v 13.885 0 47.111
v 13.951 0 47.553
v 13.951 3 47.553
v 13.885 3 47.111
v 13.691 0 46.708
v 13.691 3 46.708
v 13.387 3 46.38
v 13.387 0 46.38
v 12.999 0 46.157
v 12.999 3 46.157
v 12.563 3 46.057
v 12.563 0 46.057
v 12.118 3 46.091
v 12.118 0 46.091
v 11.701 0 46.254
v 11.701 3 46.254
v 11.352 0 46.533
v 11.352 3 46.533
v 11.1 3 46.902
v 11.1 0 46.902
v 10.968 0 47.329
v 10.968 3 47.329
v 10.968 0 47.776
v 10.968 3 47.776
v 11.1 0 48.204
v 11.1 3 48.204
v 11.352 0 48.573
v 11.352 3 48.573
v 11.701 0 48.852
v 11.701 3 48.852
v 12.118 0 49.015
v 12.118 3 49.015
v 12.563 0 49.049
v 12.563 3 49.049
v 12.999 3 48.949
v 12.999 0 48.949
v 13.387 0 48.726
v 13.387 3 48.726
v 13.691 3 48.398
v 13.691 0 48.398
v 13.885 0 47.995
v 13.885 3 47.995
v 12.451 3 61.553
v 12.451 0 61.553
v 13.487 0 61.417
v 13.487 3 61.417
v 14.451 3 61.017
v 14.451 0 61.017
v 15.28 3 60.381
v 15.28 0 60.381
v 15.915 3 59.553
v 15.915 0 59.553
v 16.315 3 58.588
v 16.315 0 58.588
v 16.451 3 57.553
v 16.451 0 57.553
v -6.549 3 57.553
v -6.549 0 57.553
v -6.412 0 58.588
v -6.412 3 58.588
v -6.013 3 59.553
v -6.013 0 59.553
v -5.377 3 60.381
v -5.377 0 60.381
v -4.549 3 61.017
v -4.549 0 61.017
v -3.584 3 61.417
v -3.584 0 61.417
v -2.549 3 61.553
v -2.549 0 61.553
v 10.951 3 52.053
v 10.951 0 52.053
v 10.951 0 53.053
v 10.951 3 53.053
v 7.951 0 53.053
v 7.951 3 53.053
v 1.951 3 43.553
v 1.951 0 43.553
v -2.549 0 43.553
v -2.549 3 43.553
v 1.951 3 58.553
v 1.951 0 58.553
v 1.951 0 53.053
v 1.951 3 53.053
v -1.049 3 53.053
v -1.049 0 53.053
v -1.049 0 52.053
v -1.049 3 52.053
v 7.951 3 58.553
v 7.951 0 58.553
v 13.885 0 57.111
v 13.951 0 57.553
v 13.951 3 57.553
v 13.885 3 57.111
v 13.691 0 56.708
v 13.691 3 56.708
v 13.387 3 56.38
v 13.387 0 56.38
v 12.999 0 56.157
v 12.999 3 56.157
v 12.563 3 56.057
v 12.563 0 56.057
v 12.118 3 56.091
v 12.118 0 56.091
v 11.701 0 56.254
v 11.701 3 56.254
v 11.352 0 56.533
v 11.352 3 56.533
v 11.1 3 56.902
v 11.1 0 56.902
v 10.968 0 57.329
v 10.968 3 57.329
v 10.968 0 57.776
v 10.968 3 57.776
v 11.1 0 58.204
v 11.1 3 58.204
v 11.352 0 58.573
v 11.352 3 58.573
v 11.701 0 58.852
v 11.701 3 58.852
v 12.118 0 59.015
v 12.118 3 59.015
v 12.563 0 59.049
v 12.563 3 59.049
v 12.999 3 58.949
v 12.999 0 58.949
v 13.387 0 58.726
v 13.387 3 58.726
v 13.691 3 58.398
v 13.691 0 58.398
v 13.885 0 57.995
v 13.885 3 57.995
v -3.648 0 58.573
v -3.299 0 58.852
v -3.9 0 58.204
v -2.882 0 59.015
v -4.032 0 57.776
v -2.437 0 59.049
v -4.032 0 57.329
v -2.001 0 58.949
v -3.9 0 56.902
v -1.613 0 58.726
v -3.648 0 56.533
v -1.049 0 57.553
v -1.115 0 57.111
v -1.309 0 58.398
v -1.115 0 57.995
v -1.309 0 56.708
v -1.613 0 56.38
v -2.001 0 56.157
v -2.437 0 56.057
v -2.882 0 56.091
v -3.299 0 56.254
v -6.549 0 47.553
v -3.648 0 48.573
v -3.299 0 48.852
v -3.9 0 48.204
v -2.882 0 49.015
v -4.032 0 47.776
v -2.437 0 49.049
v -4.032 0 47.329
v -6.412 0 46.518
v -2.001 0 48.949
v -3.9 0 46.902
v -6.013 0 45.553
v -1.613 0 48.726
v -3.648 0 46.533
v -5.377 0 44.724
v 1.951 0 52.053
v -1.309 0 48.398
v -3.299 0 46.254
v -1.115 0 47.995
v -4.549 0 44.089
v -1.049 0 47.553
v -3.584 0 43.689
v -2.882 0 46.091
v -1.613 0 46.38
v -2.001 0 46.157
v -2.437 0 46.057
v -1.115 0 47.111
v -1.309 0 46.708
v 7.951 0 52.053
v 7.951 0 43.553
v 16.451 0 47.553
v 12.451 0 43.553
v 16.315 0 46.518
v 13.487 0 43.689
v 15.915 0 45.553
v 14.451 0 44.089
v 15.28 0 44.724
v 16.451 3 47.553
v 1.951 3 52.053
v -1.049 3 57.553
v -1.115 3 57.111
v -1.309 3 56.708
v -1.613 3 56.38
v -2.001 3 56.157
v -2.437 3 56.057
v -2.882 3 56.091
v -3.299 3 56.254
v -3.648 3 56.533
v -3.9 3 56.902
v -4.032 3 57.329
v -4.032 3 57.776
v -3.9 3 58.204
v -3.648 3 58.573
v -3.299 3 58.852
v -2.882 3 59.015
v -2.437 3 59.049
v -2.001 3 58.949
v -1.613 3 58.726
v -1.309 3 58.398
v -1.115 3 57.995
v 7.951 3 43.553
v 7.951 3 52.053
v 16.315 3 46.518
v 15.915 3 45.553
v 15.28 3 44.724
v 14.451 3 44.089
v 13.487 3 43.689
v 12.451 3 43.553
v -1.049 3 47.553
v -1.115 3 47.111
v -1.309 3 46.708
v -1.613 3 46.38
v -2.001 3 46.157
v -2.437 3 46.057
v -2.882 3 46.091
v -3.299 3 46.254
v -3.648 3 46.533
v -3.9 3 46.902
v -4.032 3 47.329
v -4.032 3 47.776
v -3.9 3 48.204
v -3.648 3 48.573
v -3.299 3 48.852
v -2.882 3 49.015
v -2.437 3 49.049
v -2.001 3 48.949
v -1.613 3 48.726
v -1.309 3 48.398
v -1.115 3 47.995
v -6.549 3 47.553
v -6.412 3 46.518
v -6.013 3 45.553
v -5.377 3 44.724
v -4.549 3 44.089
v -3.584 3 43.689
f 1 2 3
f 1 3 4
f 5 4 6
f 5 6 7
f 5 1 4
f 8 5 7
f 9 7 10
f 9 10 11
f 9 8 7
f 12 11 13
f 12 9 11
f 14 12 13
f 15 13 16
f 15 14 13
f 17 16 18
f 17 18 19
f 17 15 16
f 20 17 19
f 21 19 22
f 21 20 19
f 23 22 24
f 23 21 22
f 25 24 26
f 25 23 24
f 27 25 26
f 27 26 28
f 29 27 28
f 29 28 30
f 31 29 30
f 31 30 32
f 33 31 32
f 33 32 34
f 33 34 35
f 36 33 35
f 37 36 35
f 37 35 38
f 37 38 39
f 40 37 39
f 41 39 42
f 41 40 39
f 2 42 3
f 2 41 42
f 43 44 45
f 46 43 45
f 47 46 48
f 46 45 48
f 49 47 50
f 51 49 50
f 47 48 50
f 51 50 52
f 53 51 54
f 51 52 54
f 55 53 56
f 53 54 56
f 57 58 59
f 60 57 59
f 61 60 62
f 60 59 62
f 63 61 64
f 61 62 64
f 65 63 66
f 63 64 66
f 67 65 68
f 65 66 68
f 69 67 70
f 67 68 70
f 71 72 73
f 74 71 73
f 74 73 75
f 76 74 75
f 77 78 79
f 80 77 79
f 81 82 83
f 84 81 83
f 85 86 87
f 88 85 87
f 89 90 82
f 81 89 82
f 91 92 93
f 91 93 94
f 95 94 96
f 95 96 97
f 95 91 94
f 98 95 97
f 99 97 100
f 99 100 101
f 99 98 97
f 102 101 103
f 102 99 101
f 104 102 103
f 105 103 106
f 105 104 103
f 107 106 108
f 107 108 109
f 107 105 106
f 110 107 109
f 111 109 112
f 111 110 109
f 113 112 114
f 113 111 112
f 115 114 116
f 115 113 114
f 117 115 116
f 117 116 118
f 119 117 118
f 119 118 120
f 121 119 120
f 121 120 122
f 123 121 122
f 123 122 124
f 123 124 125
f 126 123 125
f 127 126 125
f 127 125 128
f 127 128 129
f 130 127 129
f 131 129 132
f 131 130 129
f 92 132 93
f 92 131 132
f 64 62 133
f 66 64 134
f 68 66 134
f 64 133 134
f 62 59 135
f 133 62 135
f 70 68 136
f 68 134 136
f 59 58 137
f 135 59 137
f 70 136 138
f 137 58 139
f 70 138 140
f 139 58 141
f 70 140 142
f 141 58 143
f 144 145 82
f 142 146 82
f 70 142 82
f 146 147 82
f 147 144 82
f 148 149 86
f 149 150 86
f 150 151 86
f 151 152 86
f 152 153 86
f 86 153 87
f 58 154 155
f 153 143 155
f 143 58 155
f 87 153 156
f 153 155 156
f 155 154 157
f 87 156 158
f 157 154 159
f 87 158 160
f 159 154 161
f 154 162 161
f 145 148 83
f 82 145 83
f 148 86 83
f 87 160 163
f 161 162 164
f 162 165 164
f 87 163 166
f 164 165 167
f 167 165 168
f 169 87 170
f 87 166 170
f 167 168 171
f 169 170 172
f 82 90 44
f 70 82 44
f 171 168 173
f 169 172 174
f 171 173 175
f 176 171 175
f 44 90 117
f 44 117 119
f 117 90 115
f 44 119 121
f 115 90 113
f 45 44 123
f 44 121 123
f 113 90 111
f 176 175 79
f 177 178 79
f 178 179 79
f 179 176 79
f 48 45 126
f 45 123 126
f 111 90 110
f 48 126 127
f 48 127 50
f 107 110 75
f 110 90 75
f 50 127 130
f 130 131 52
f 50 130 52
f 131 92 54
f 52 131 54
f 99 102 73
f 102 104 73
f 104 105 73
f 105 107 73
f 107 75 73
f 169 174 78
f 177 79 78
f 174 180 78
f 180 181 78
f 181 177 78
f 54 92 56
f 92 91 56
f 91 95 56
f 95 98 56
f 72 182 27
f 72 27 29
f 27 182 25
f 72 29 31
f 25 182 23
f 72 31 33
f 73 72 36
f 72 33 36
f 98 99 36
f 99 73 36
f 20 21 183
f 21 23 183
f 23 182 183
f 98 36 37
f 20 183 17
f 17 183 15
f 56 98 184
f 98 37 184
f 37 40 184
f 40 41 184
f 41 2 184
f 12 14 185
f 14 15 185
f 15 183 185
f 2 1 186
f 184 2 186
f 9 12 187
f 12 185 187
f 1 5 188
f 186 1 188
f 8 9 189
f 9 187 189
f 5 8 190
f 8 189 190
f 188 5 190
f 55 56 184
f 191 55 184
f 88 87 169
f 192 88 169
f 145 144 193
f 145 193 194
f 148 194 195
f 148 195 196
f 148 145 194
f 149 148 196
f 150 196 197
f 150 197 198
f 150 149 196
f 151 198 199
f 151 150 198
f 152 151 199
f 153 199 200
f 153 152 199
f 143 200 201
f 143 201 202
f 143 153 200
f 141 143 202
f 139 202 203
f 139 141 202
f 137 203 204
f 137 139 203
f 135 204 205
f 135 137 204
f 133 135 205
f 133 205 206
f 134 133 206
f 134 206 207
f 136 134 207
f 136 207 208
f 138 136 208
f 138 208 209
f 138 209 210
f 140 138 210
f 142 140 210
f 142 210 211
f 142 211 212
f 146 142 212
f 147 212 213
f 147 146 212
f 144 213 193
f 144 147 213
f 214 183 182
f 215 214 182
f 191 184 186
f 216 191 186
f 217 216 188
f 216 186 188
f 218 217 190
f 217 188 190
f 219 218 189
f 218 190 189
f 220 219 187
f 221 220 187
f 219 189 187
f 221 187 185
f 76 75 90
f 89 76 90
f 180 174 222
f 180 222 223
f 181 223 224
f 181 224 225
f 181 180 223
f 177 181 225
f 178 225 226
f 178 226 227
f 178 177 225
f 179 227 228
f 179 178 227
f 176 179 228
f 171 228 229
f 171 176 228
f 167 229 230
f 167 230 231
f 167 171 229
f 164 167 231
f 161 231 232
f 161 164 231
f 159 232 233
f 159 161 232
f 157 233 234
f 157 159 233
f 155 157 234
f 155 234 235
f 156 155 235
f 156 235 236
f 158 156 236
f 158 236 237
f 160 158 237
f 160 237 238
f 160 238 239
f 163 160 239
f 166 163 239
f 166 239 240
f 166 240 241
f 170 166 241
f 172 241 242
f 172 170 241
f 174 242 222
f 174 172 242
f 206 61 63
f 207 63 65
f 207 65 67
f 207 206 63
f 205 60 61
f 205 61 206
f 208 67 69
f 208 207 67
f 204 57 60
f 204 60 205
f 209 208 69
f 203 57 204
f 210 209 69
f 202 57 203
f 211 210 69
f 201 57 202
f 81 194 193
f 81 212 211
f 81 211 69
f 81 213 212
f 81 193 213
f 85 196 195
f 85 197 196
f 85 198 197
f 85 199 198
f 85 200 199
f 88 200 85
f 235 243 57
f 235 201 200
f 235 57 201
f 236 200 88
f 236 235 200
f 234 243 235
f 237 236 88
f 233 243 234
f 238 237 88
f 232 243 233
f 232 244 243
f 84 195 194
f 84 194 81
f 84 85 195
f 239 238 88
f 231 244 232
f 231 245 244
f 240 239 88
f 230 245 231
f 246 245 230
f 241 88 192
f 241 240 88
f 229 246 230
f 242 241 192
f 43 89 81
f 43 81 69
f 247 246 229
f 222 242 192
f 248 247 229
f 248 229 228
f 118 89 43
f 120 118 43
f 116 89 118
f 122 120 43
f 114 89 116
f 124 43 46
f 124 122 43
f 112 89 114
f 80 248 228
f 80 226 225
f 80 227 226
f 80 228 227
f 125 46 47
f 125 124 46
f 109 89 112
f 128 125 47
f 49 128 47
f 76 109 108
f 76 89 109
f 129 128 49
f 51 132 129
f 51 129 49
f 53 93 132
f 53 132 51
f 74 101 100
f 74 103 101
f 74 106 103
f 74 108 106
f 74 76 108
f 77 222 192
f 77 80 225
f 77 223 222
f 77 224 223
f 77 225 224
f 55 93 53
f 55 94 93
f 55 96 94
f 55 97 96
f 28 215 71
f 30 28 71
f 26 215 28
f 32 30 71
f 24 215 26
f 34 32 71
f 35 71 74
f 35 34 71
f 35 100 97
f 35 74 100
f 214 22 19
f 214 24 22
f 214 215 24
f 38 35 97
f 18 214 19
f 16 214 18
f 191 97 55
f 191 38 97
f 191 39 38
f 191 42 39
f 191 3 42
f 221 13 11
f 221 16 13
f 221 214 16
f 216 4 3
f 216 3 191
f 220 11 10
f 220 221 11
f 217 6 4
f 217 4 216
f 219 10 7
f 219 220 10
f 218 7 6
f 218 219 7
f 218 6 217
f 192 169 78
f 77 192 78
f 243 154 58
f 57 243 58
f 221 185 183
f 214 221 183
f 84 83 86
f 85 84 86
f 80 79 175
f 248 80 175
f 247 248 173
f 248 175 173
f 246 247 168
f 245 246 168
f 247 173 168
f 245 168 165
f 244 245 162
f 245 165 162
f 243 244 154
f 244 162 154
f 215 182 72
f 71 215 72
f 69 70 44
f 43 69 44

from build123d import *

# Parameters (mm, degrees)
SKETCH1_R           = 1.5
BOSS_EXTRUDE1_DEPTH = 3


with BuildPart() as part:
    # Sketch1 → Boss-Extrude1 (new body)
    with BuildSketch(Plane(origin=(0, 0, 0), x_dir=(1, 0, 0), z_dir=(0, 1, 0))):
        with BuildLine():
            Line((7.951300085, -43.552898009), (7.95129997, -52.052898009))
            Line((7.95129997, -52.052898009), (10.95129997, -52.052898009))
            Line((10.95129997, -52.052898009), (10.95129997, -53.052897806))
            Line((10.95129997, -53.052897806), (7.95129997, -53.052897806))
            Line((7.95129997, -53.052897806), (7.95129997, -58.552897806))
            Line((7.95129997, -58.552897806), (1.95129997, -58.552897806))
            Line((1.95129997, -58.552897806), (1.95129997, -53.052897806))
            Line((1.95129997, -53.052897806), (-1.04870003, -53.052897806))
            Line((-1.04870003, -53.052897806), (-1.04870003, -52.052897806))
            Line((-1.04870003, -52.052897806), (1.95129997, -52.052897806))
            Line((1.95129997, -52.052897806), (1.951300085, -43.552897806))
            Line((1.951300085, -43.552897806), (-2.548699915, -43.552897806))
            ThreePointArc((-2.548699915, -43.552897806), (-5.377127055, -44.724470643), (-6.548699969, -47.552897752))
            Line((-6.548699969, -47.552897752), (-6.548700104, -57.552897752))
            ThreePointArc((-6.548700104, -57.552897752), (-5.377127267, -60.381324893), (-2.548700158, -61.552897806))
            Line((-2.548700158, -61.552897806), (12.451299842, -61.552898009))
            ThreePointArc((12.451299842, -61.552898009), (15.279726982, -60.381325172), (16.451299896, -57.552898064))
            Line((16.451299896, -57.552898064), (16.451300031, -47.552898064))
            ThreePointArc((16.451300031, -47.552898064), (15.279727194, -44.724470923), (12.451300085, -43.552898009))
            Line((12.451300085, -43.552898009), (7.951300085, -43.552898009))
        make_face()
        with Locations((12.451300031, -47.552898009)):
            Circle(SKETCH1_R, mode=Mode.SUBTRACT)
        with Locations((12.451299896, -57.552898009)):
            Circle(SKETCH1_R, mode=Mode.SUBTRACT)
        with Locations((-2.548700104, -57.552897806)):
            Circle(SKETCH1_R, mode=Mode.SUBTRACT)
        with Locations((-2.548699969, -47.552897806)):
            Circle(SKETCH1_R, mode=Mode.SUBTRACT)
    extrude(amount=BOSS_EXTRUDE1_DEPTH)


solid = part.part
